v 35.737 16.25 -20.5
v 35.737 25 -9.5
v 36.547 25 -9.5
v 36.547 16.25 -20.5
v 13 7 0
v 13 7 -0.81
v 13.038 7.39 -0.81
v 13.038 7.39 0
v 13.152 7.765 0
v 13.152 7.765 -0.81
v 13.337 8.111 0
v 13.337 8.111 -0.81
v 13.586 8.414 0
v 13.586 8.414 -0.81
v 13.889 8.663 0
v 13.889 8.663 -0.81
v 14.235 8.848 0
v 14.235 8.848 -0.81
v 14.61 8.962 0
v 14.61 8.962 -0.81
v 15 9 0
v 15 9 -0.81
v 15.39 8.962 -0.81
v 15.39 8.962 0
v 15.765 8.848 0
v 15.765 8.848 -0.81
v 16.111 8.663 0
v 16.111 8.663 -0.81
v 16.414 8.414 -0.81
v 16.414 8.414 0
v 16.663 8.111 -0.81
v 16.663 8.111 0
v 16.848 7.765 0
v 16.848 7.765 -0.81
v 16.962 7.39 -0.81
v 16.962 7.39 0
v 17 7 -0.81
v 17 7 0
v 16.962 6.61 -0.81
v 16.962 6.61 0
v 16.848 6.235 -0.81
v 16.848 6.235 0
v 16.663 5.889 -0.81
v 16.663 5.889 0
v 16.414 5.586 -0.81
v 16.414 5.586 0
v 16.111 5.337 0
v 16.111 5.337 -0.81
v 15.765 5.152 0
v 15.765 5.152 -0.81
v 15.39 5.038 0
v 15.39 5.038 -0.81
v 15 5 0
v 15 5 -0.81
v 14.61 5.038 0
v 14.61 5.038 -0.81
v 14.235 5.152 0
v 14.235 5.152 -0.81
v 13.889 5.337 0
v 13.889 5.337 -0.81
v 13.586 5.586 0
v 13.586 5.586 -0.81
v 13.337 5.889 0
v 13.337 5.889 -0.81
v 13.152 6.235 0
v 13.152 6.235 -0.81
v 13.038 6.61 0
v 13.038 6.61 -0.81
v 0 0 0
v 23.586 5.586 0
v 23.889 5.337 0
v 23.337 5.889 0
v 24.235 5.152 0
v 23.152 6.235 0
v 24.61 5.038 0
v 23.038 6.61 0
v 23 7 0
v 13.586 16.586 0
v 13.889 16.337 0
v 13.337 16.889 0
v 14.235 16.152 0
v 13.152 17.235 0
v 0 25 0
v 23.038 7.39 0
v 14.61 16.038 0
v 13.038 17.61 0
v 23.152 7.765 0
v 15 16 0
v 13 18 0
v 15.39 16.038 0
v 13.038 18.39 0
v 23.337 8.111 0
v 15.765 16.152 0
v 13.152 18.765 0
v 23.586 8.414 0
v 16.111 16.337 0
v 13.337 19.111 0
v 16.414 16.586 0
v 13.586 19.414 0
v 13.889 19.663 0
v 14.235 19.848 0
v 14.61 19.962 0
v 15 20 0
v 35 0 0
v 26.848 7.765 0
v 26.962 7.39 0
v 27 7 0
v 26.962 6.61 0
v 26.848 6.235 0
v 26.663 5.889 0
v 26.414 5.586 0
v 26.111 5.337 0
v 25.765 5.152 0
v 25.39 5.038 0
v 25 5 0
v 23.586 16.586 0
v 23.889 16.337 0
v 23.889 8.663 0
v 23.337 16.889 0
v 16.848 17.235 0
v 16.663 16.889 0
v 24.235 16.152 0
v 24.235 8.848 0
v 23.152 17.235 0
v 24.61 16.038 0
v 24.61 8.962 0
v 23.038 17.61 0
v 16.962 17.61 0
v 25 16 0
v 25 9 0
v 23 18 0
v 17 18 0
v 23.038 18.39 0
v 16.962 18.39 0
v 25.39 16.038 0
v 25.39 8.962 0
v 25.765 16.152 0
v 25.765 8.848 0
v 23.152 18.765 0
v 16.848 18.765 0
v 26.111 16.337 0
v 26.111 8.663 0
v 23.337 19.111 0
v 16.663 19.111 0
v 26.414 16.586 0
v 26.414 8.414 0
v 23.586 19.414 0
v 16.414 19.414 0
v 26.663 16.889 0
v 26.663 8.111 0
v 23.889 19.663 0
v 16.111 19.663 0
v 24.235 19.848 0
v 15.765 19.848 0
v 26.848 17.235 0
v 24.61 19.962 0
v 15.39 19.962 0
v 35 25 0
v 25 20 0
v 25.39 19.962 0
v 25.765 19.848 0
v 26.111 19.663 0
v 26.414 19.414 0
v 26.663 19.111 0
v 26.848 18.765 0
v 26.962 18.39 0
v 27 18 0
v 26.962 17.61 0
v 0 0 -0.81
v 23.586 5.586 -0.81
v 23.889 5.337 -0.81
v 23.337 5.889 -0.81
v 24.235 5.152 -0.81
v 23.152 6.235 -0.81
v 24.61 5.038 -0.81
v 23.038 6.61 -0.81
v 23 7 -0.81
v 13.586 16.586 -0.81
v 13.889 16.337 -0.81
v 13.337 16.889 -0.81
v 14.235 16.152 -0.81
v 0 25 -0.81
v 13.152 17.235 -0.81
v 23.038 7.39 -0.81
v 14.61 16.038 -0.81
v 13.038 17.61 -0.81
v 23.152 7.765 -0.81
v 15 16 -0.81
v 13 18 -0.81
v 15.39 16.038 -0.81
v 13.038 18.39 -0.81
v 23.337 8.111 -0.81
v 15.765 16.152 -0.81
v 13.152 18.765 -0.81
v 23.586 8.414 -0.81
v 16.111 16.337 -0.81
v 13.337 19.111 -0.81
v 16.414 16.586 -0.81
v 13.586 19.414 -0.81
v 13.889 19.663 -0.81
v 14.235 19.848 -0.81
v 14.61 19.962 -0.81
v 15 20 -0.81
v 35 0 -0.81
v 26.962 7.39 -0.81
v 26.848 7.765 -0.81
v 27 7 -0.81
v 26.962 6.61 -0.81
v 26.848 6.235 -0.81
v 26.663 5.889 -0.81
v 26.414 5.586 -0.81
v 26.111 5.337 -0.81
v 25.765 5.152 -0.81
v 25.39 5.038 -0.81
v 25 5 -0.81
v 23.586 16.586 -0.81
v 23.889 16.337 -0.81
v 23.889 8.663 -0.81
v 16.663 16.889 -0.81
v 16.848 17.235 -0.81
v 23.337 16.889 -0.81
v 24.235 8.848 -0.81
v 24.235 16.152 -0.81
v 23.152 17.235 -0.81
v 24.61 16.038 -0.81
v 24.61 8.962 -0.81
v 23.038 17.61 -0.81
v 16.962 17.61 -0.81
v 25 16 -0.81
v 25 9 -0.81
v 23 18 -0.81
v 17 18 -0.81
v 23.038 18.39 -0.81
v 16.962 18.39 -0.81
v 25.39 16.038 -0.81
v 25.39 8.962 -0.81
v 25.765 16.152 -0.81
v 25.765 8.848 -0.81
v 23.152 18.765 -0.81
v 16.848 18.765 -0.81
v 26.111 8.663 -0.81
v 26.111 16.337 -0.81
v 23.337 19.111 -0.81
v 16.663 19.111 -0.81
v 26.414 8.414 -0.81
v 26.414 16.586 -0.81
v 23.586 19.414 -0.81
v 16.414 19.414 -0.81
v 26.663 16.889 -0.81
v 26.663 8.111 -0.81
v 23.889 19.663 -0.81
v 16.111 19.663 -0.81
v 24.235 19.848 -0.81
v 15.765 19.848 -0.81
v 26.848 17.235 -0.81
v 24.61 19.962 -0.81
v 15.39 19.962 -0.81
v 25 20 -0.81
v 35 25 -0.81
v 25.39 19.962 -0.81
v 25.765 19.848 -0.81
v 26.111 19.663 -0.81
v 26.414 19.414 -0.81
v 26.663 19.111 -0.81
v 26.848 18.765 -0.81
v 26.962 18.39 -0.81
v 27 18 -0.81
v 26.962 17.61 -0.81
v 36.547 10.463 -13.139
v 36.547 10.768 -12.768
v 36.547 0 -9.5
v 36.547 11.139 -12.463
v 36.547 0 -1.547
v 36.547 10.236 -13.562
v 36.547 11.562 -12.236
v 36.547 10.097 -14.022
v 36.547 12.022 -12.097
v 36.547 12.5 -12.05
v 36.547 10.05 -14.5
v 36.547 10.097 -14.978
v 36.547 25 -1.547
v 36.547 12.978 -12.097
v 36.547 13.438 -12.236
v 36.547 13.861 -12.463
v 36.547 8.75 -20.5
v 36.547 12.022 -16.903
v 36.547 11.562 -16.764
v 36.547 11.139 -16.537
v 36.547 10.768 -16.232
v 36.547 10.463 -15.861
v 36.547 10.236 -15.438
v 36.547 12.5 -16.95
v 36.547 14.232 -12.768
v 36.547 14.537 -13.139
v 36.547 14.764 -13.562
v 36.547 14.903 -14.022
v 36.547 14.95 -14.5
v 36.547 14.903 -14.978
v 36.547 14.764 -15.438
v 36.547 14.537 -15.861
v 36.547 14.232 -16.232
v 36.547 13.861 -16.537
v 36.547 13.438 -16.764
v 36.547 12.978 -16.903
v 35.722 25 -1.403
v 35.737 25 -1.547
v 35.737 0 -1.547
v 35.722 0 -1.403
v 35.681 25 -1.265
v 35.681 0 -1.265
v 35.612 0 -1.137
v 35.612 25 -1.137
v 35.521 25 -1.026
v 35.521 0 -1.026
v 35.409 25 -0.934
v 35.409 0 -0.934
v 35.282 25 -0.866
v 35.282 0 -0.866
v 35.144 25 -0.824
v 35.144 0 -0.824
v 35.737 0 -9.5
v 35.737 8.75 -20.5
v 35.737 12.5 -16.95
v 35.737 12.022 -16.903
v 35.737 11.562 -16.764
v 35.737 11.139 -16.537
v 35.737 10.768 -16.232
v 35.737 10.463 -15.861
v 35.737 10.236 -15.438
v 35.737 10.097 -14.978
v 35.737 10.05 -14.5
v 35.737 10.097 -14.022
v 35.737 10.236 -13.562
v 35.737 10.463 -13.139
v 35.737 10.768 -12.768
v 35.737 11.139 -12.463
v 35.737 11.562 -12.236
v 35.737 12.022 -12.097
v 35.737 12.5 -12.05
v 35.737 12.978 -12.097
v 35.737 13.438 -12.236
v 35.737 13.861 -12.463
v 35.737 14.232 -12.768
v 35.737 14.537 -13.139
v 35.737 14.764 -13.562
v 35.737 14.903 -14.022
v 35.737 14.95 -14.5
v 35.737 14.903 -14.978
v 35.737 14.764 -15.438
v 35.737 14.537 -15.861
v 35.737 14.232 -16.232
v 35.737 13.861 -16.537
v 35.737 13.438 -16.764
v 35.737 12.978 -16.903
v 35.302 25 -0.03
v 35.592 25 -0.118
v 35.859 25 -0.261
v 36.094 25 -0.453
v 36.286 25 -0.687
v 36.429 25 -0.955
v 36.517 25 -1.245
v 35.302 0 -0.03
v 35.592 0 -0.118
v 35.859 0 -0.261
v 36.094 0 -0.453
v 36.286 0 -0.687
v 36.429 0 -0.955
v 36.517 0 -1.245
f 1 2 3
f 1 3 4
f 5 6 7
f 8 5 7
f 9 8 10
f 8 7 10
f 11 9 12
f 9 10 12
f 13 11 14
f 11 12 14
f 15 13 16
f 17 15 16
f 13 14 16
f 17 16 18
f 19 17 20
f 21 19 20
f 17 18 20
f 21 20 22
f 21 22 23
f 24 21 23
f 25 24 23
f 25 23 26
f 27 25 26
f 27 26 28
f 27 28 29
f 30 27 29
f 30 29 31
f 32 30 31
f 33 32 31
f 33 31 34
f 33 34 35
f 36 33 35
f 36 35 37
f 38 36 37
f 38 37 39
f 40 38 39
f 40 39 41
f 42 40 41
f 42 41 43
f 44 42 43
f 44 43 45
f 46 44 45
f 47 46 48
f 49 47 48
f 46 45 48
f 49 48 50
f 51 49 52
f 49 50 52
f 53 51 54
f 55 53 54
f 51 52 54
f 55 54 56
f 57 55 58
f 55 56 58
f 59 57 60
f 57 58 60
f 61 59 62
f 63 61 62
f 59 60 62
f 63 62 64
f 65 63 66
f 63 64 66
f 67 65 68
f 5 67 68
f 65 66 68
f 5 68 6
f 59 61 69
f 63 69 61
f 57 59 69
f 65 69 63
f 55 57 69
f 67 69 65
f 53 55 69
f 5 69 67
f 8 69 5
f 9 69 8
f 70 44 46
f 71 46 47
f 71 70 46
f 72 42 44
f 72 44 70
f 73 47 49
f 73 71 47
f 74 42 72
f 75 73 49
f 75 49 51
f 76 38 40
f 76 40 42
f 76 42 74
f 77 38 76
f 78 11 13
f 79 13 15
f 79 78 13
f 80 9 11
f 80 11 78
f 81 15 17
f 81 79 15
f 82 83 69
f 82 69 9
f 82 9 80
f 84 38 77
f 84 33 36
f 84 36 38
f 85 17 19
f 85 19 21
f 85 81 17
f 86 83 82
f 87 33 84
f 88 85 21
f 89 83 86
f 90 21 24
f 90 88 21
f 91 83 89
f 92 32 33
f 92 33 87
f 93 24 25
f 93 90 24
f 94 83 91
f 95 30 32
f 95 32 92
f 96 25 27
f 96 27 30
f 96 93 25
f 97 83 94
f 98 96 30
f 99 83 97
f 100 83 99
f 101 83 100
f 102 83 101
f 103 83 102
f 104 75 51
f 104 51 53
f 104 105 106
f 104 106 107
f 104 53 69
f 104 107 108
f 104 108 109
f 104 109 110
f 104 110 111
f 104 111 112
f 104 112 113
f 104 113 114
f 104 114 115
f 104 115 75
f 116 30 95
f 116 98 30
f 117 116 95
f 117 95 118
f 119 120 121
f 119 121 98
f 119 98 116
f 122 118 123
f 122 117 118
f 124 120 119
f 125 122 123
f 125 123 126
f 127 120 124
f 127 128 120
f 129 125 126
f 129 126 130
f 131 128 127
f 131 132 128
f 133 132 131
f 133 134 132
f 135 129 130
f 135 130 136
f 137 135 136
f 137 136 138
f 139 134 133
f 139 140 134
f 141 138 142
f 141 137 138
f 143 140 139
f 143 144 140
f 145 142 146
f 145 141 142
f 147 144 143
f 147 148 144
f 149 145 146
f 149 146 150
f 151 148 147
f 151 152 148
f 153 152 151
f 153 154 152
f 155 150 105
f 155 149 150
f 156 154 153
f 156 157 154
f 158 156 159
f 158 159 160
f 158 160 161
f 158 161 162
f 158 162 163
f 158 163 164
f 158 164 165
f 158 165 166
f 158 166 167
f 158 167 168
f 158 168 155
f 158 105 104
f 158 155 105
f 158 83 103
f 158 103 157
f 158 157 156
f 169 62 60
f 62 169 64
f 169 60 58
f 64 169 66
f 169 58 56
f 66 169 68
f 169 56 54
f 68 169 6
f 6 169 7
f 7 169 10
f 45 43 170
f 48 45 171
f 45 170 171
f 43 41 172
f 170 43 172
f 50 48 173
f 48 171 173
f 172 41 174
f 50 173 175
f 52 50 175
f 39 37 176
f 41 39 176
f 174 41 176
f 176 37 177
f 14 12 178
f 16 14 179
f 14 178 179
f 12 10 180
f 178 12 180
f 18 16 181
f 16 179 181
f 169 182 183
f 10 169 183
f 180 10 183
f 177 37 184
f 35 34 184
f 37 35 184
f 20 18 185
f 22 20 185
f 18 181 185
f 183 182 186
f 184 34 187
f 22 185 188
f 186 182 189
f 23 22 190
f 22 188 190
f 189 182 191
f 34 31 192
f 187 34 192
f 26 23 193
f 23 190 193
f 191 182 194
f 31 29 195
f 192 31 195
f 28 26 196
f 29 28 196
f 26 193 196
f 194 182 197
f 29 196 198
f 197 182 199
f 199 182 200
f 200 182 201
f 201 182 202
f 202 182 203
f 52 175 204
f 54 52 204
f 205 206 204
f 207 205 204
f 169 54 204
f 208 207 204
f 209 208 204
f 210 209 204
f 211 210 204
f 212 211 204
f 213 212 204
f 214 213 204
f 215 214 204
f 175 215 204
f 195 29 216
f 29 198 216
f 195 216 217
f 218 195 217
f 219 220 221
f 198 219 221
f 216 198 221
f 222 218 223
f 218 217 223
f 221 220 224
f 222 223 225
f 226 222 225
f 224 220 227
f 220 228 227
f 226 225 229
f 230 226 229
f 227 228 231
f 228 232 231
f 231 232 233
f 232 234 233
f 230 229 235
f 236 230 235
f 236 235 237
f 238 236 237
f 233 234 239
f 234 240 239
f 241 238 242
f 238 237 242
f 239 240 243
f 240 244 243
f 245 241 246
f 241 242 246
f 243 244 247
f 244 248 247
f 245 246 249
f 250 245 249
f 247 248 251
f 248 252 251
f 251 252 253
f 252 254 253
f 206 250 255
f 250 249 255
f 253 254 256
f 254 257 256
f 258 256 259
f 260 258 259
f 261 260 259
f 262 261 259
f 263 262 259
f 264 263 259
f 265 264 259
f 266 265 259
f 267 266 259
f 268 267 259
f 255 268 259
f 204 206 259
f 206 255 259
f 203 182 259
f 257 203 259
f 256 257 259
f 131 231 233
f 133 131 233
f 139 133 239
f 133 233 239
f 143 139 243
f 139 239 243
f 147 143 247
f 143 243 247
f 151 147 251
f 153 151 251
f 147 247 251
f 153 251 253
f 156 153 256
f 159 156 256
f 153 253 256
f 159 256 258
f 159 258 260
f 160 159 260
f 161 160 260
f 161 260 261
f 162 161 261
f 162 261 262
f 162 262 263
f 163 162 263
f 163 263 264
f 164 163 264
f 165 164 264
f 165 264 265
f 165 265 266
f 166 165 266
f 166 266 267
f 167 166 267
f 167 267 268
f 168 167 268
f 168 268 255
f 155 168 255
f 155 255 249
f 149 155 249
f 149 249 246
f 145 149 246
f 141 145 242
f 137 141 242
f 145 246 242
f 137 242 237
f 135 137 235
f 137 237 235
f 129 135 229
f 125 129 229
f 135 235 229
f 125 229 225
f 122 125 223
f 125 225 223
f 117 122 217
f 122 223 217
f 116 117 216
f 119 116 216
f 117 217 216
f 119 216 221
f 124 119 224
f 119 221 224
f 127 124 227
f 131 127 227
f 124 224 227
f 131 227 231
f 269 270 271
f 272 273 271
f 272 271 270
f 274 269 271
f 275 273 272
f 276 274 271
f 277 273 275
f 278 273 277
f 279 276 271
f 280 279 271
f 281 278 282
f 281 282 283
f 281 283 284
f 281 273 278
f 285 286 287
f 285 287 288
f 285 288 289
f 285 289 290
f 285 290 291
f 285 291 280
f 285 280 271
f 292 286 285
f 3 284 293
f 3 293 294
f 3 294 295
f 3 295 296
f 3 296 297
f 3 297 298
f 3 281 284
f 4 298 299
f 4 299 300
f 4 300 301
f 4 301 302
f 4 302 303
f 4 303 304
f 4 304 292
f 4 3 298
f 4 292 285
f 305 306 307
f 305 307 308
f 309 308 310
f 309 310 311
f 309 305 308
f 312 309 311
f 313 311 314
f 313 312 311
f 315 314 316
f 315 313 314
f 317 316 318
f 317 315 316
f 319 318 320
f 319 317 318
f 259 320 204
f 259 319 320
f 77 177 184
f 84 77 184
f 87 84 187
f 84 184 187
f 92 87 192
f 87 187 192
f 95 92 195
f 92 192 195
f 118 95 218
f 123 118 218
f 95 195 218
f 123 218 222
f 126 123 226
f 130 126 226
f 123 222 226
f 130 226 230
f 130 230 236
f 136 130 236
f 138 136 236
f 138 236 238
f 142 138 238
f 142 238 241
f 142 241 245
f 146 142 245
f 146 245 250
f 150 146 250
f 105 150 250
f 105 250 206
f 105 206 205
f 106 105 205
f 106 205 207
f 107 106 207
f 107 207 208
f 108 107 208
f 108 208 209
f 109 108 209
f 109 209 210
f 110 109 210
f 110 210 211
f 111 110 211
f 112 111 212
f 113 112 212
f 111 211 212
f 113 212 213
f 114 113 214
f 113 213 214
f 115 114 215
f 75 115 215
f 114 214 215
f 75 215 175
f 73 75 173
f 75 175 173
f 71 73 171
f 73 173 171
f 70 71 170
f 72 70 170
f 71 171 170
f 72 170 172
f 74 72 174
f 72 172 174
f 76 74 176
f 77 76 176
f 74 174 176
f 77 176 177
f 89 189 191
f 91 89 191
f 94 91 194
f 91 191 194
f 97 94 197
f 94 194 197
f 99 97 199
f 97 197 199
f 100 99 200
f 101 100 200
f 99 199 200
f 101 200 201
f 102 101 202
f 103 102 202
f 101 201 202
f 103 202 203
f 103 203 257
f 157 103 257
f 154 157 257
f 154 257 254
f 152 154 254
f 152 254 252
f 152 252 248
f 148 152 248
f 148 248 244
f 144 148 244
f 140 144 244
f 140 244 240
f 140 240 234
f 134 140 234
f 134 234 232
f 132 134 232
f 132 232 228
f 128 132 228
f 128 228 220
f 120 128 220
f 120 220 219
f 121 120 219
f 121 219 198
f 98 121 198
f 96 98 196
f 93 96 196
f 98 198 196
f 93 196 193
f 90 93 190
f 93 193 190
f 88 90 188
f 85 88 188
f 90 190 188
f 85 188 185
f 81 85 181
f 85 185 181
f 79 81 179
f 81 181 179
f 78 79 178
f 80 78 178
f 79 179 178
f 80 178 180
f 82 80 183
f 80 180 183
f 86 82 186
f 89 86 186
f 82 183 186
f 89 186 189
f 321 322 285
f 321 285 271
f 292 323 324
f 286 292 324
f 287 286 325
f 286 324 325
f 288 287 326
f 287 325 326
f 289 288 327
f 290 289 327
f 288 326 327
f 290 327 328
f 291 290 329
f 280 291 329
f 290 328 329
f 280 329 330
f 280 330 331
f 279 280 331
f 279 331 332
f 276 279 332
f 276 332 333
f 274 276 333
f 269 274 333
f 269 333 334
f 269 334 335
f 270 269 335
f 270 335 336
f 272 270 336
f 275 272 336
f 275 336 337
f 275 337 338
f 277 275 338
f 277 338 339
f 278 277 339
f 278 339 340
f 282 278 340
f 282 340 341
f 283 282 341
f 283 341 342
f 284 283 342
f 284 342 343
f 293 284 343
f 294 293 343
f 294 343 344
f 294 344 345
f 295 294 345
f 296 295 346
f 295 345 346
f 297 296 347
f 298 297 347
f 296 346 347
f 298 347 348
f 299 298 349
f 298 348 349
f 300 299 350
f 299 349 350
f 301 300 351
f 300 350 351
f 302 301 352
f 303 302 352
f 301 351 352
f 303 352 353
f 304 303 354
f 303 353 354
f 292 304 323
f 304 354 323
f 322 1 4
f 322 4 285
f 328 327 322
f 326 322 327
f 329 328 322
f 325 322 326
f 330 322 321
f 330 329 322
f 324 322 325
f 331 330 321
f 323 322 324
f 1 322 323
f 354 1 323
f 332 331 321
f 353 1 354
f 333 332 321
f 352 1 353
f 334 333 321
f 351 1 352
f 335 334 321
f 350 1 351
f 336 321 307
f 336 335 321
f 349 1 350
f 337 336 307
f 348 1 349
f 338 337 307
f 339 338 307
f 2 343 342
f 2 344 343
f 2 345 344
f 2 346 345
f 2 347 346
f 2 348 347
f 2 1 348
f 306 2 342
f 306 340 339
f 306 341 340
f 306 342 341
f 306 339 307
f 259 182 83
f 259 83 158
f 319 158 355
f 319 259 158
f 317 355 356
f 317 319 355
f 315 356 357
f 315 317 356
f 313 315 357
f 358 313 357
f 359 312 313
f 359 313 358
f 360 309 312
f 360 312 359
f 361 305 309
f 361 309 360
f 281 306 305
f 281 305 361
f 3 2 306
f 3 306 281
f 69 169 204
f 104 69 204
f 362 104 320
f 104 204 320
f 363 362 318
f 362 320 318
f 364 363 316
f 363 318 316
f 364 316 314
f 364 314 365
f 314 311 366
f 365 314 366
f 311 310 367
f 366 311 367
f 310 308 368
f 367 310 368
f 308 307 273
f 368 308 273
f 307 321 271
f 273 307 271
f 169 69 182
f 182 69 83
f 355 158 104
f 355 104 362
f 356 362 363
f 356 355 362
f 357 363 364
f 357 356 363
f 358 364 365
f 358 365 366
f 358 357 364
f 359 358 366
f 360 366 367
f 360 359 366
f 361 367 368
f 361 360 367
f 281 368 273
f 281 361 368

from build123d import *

# Parameters (mm, degrees)
SKETCH1_W          = 35
SKETCH1_H          = 25
BASE_FLANGE1_DEPTH = 0.81
EDGE_FLANGE1_DEPTH = 25
CUT_EXTRUDE1_REACH = 57.943
SKETCH9_R          = 2
CUT_EXTRUDE2_REACH = 57.921
SKETCH11_R         = 2.45


# Sheet-metal steps are written as plain solids
with BuildPart() as part:
    # Sketch1 → Base-Flange1 (new body)
    with BuildSketch(Plane.XY):
        with Locations((17.5, 12.5)):
            Rectangle(SKETCH1_W, SKETCH1_H)
    extrude(amount=-BASE_FLANGE1_DEPTH)

    # Edge-Flange1 section (across the edge) → Edge-Flange1 (add)
    with BuildSketch(Plane(origin=(35.7366, 25, -0.81), x_dir=(-1, 0, 0), z_dir=(0, -1, 0))):
        with BuildLine():
            Line((-0.81, 0.7366), (-0.81, 34.19))
            Line((-0.81, 34.19), (0, 34.19))
            Line((0, 34.19), (0, 0.7366))
            ThreePointArc((0, 0.7366), (0.215745145, 0.215745145), (0.7366, 0))
            Line((0.7366, 0), (0.7366, -0.81))
            ThreePointArc((0.7366, -0.81), (-0.357011348, -0.357011348), (-0.81, 0.7366))
        make_face()
    extrude(amount=EDGE_FLANGE1_DEPTH)

    # Sketch9 → Cut-Extrude1 (cut, up to next)
    with BuildSketch(Plane(origin=(0, 0, -0.81), x_dir=(-1, 0, 0), z_dir=(0, 0, -1)), mode=Mode.PRIVATE) as cut_extrude1_sk1:
        with Locations((-25, 18)):
            Circle(SKETCH9_R)
    cut_extrude1_tool1 = extrude(cut_extrude1_sk1.sketch, amount=-CUT_EXTRUDE1_REACH, mode=Mode.PRIVATE) & part.part
    # Sketch9 → Cut-Extrude1 (cut, up to next)
    with BuildSketch(Plane(origin=(0, 0, -0.81), x_dir=(-1, 0, 0), z_dir=(0, 0, -1)), mode=Mode.PRIVATE) as cut_extrude1_sk2:
        with Locations((-25, 7)):
            Circle(SKETCH9_R)
    cut_extrude1_tool2 = extrude(cut_extrude1_sk2.sketch, amount=-CUT_EXTRUDE1_REACH, mode=Mode.PRIVATE) & part.part
    # Sketch9 → Cut-Extrude1 (cut, up to next)
    with BuildSketch(Plane(origin=(0, 0, -0.81), x_dir=(-1, 0, 0), z_dir=(0, 0, -1)), mode=Mode.PRIVATE) as cut_extrude1_sk3:
        with Locations((-15, 18)):
            Circle(SKETCH9_R)
    cut_extrude1_tool3 = extrude(cut_extrude1_sk3.sketch, amount=-CUT_EXTRUDE1_REACH, mode=Mode.PRIVATE) & part.part
    # Sketch9 → Cut-Extrude1 (cut, up to next)
    with BuildSketch(Plane(origin=(0, 0, -0.81), x_dir=(-1, 0, 0), z_dir=(0, 0, -1)), mode=Mode.PRIVATE) as cut_extrude1_sk4:
        with Locations((-15, 7)):
            Circle(SKETCH9_R)
    cut_extrude1_tool4 = extrude(cut_extrude1_sk4.sketch, amount=-CUT_EXTRUDE1_REACH, mode=Mode.PRIVATE) & part.part
    add(cut_extrude1_tool1.solids().sort_by_distance((25, 18, -0.81))[0], mode=Mode.SUBTRACT)
    add(cut_extrude1_tool2.solids().sort_by_distance((25, 7, -0.81))[0], mode=Mode.SUBTRACT)
    add(cut_extrude1_tool3.solids().sort_by_distance((15, 18, -0.81))[0], mode=Mode.SUBTRACT)
    add(cut_extrude1_tool4.solids().sort_by_distance((15, 7, -0.81))[0], mode=Mode.SUBTRACT)

    # Sketch11 → Cut-Extrude2 (cut, up to next)
    with BuildSketch(Plane.ZY.offset(-35.7366), mode=Mode.PRIVATE) as cut_extrude2_sk1:
        with Locations(Location((-14.5, 12.5, 0), (0, 0, 180))):
            Circle(SKETCH11_R)
    cut_extrude2_tool1 = extrude(cut_extrude2_sk1.sketch, amount=-CUT_EXTRUDE2_REACH, mode=Mode.PRIVATE) & part.part
    # Sketch11 → Cut-Extrude2 (cut, up to next)
    with BuildSketch(Plane.ZY.offset(-35.7366), mode=Mode.PRIVATE) as cut_extrude2_sk2:
        Polygon((-9.5, 25), (-20.5, 16.25), (-20.5, 8.75), (-9.5, 0), (-14.5, 0), (-39.5, 0), (-39.5, 25), (-14.5, 25), align=None)
    cut_extrude2_tool2 = extrude(cut_extrude2_sk2.sketch, amount=-CUT_EXTRUDE2_REACH, mode=Mode.PRIVATE) & part.part
    add(cut_extrude2_tool1.solids().sort_by_distance((35.7366, 12.5, -14.5))[0], mode=Mode.SUBTRACT)
    add(cut_extrude2_tool2.solids().sort_by_distance((35.7366, 12.5, -27.781546))[0], mode=Mode.SUBTRACT)


solid = part.part
